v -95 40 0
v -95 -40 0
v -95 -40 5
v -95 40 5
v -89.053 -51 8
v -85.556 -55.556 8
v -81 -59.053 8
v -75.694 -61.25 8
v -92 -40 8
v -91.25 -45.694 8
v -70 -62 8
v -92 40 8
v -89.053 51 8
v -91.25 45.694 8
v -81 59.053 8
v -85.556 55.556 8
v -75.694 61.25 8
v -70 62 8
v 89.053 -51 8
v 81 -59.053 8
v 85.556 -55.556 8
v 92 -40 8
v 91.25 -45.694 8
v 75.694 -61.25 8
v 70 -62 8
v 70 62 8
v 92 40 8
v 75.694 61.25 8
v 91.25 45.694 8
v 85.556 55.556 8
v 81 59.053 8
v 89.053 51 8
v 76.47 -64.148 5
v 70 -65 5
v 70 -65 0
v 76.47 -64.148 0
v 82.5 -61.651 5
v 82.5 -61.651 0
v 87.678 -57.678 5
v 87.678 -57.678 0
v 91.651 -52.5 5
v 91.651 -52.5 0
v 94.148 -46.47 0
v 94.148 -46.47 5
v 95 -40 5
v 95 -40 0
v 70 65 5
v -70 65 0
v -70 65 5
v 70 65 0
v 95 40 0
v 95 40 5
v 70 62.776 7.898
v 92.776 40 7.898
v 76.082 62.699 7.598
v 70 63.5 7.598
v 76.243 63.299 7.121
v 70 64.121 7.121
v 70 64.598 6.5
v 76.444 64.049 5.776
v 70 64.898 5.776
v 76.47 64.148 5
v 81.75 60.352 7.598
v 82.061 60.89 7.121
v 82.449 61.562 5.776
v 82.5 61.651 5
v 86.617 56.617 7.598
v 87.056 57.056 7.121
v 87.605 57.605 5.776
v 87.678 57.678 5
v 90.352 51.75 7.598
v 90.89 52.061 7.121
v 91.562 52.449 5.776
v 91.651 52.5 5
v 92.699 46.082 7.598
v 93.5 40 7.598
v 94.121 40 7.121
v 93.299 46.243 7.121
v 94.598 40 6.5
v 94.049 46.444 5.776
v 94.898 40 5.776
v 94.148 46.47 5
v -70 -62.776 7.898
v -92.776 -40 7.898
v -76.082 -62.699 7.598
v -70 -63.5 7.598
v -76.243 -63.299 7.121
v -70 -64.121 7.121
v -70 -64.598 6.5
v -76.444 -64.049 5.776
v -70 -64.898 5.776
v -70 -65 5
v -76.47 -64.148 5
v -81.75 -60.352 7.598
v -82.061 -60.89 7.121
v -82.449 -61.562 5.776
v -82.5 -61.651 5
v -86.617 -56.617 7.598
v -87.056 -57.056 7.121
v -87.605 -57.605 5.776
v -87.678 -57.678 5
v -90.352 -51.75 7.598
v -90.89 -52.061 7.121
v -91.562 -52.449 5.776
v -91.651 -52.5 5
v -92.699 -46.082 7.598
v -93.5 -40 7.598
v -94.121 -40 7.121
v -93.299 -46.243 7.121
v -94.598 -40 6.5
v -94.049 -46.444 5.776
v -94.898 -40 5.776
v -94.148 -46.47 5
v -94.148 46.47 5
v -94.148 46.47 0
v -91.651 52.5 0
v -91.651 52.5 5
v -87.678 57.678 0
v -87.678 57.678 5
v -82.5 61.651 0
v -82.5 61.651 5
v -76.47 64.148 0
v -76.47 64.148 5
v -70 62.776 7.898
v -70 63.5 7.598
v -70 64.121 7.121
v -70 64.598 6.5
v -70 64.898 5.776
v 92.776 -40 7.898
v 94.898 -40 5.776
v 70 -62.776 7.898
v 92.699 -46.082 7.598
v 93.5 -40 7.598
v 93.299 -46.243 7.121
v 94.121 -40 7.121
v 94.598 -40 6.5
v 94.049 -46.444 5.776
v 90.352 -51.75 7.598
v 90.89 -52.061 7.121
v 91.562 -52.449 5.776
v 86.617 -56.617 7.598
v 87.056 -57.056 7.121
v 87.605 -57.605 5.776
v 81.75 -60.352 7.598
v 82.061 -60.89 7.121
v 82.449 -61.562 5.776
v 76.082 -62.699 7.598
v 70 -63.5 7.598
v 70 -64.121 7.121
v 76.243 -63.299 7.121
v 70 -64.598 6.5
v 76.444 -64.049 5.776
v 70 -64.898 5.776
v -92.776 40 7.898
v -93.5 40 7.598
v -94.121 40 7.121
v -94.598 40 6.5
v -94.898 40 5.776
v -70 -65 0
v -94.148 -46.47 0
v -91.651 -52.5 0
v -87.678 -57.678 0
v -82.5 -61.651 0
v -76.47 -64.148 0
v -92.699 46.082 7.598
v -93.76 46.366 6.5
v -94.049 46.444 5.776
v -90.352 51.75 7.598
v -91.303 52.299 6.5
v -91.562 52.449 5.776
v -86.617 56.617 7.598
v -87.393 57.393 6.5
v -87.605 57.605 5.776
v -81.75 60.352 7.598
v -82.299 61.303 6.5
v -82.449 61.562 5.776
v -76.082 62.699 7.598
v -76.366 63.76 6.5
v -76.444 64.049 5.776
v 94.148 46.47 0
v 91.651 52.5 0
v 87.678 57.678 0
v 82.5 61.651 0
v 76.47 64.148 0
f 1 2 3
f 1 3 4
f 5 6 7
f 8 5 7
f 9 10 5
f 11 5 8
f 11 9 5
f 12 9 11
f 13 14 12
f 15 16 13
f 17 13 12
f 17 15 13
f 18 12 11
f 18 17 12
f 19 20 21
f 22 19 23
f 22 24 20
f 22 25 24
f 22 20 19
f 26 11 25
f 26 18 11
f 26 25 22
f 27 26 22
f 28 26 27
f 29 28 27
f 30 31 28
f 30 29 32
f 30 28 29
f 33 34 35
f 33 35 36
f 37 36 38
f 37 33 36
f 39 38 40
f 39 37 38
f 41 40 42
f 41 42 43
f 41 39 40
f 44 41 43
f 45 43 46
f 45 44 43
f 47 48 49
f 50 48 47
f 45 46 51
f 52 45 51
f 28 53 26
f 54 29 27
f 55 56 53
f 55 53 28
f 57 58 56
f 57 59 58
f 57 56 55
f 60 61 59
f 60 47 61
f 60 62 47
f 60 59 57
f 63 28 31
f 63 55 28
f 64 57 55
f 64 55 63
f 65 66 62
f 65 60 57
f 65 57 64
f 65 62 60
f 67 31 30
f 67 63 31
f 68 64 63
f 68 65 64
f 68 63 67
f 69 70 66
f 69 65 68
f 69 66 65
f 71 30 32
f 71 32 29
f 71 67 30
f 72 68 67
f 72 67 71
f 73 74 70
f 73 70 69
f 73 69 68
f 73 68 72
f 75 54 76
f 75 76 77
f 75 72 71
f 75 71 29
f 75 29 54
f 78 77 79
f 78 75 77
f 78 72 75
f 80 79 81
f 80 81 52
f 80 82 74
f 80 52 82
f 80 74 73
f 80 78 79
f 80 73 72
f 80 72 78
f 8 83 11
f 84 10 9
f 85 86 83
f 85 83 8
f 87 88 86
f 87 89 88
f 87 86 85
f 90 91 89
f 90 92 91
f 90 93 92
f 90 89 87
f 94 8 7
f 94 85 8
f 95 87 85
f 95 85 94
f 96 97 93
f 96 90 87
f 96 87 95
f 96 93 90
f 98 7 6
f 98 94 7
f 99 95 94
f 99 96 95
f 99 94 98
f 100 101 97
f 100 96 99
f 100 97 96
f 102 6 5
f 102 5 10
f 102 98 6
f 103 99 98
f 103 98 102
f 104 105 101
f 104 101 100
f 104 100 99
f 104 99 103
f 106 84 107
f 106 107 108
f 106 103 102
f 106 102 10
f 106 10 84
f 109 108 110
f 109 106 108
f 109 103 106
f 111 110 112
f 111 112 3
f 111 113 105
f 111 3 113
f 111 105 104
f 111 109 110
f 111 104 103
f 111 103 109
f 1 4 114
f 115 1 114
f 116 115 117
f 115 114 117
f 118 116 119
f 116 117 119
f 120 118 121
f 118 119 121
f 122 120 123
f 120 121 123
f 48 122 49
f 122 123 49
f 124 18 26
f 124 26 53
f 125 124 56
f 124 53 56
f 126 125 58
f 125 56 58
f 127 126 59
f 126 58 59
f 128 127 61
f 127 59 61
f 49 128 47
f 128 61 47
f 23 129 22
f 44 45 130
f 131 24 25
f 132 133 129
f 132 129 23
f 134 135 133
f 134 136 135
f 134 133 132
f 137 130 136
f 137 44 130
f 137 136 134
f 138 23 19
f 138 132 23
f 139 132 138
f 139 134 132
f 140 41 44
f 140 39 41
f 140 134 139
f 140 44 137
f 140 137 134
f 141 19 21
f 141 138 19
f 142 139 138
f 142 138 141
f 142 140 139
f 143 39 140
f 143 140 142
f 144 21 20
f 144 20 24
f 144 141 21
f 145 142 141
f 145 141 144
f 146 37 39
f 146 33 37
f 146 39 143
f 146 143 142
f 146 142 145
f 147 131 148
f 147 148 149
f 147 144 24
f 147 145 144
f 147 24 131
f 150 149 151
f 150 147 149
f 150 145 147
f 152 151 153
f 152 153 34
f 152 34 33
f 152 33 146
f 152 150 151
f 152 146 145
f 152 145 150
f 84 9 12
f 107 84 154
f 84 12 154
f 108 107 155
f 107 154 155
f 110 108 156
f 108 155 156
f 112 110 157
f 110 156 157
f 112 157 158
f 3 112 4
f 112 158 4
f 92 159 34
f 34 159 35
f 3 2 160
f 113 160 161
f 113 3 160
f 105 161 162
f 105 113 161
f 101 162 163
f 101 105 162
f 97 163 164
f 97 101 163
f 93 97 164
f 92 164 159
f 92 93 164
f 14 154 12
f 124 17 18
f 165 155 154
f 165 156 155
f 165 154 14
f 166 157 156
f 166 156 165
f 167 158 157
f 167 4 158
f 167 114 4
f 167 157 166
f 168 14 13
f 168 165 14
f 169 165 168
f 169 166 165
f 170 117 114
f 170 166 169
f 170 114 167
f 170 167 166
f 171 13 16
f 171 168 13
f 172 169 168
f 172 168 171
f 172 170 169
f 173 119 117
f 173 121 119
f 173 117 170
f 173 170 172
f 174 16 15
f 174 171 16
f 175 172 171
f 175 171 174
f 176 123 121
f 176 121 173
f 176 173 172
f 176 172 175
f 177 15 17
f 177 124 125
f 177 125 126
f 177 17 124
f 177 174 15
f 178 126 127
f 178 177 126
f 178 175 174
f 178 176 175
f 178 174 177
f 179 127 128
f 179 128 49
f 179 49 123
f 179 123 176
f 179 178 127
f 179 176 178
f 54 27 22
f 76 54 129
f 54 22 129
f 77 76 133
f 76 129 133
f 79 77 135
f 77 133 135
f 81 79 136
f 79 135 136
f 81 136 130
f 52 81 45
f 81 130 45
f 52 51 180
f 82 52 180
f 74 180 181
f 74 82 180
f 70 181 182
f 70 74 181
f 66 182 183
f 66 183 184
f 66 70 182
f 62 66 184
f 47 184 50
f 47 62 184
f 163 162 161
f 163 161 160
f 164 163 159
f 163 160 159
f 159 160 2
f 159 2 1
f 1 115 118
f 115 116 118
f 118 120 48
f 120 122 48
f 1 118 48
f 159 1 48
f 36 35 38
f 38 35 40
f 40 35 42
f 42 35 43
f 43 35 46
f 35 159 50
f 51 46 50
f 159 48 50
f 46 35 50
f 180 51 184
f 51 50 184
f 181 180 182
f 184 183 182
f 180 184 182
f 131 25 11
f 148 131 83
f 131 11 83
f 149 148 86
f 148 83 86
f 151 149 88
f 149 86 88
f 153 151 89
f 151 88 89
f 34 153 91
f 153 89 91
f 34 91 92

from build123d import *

# Parameters (mm, degrees)
F0_W     = 190
F0_H     = 130
F1_DEPTH = 8
F2_R     = 25
F3_R     = 3


with BuildPart() as f1:
    # F0 (on Top) → F1 (new body)
    with BuildSketch(Plane.XY):
        Rectangle(F0_W, F0_H)
    extrude(amount=F1_DEPTH)

    # F2
    f2_edges = [f1.edges().sort_by_distance(p)[0] for p in [
        (-95, 65, 4),
        (-95, -65, 4),
        (95, -65, 4),
        (95, 65, 4),
    ]]
    fillet(f2_edges, radius=F2_R)

    # F3
    f3_edges = [f1.edges().sort_by_distance(p)[0] for p in [
        (0, 65, 8),
        (87.67767, 57.67767, 8),
        (-87.67767, 57.67767, 8),
        (95, 0, 8),
        (-95, 0, 8),
        (87.67767, -57.67767, 8),
        (-87.67767, -57.67767, 8),
        (0, -65, 8),
    ]]
    fillet(f3_edges, radius=F3_R)


solid = f1.part
